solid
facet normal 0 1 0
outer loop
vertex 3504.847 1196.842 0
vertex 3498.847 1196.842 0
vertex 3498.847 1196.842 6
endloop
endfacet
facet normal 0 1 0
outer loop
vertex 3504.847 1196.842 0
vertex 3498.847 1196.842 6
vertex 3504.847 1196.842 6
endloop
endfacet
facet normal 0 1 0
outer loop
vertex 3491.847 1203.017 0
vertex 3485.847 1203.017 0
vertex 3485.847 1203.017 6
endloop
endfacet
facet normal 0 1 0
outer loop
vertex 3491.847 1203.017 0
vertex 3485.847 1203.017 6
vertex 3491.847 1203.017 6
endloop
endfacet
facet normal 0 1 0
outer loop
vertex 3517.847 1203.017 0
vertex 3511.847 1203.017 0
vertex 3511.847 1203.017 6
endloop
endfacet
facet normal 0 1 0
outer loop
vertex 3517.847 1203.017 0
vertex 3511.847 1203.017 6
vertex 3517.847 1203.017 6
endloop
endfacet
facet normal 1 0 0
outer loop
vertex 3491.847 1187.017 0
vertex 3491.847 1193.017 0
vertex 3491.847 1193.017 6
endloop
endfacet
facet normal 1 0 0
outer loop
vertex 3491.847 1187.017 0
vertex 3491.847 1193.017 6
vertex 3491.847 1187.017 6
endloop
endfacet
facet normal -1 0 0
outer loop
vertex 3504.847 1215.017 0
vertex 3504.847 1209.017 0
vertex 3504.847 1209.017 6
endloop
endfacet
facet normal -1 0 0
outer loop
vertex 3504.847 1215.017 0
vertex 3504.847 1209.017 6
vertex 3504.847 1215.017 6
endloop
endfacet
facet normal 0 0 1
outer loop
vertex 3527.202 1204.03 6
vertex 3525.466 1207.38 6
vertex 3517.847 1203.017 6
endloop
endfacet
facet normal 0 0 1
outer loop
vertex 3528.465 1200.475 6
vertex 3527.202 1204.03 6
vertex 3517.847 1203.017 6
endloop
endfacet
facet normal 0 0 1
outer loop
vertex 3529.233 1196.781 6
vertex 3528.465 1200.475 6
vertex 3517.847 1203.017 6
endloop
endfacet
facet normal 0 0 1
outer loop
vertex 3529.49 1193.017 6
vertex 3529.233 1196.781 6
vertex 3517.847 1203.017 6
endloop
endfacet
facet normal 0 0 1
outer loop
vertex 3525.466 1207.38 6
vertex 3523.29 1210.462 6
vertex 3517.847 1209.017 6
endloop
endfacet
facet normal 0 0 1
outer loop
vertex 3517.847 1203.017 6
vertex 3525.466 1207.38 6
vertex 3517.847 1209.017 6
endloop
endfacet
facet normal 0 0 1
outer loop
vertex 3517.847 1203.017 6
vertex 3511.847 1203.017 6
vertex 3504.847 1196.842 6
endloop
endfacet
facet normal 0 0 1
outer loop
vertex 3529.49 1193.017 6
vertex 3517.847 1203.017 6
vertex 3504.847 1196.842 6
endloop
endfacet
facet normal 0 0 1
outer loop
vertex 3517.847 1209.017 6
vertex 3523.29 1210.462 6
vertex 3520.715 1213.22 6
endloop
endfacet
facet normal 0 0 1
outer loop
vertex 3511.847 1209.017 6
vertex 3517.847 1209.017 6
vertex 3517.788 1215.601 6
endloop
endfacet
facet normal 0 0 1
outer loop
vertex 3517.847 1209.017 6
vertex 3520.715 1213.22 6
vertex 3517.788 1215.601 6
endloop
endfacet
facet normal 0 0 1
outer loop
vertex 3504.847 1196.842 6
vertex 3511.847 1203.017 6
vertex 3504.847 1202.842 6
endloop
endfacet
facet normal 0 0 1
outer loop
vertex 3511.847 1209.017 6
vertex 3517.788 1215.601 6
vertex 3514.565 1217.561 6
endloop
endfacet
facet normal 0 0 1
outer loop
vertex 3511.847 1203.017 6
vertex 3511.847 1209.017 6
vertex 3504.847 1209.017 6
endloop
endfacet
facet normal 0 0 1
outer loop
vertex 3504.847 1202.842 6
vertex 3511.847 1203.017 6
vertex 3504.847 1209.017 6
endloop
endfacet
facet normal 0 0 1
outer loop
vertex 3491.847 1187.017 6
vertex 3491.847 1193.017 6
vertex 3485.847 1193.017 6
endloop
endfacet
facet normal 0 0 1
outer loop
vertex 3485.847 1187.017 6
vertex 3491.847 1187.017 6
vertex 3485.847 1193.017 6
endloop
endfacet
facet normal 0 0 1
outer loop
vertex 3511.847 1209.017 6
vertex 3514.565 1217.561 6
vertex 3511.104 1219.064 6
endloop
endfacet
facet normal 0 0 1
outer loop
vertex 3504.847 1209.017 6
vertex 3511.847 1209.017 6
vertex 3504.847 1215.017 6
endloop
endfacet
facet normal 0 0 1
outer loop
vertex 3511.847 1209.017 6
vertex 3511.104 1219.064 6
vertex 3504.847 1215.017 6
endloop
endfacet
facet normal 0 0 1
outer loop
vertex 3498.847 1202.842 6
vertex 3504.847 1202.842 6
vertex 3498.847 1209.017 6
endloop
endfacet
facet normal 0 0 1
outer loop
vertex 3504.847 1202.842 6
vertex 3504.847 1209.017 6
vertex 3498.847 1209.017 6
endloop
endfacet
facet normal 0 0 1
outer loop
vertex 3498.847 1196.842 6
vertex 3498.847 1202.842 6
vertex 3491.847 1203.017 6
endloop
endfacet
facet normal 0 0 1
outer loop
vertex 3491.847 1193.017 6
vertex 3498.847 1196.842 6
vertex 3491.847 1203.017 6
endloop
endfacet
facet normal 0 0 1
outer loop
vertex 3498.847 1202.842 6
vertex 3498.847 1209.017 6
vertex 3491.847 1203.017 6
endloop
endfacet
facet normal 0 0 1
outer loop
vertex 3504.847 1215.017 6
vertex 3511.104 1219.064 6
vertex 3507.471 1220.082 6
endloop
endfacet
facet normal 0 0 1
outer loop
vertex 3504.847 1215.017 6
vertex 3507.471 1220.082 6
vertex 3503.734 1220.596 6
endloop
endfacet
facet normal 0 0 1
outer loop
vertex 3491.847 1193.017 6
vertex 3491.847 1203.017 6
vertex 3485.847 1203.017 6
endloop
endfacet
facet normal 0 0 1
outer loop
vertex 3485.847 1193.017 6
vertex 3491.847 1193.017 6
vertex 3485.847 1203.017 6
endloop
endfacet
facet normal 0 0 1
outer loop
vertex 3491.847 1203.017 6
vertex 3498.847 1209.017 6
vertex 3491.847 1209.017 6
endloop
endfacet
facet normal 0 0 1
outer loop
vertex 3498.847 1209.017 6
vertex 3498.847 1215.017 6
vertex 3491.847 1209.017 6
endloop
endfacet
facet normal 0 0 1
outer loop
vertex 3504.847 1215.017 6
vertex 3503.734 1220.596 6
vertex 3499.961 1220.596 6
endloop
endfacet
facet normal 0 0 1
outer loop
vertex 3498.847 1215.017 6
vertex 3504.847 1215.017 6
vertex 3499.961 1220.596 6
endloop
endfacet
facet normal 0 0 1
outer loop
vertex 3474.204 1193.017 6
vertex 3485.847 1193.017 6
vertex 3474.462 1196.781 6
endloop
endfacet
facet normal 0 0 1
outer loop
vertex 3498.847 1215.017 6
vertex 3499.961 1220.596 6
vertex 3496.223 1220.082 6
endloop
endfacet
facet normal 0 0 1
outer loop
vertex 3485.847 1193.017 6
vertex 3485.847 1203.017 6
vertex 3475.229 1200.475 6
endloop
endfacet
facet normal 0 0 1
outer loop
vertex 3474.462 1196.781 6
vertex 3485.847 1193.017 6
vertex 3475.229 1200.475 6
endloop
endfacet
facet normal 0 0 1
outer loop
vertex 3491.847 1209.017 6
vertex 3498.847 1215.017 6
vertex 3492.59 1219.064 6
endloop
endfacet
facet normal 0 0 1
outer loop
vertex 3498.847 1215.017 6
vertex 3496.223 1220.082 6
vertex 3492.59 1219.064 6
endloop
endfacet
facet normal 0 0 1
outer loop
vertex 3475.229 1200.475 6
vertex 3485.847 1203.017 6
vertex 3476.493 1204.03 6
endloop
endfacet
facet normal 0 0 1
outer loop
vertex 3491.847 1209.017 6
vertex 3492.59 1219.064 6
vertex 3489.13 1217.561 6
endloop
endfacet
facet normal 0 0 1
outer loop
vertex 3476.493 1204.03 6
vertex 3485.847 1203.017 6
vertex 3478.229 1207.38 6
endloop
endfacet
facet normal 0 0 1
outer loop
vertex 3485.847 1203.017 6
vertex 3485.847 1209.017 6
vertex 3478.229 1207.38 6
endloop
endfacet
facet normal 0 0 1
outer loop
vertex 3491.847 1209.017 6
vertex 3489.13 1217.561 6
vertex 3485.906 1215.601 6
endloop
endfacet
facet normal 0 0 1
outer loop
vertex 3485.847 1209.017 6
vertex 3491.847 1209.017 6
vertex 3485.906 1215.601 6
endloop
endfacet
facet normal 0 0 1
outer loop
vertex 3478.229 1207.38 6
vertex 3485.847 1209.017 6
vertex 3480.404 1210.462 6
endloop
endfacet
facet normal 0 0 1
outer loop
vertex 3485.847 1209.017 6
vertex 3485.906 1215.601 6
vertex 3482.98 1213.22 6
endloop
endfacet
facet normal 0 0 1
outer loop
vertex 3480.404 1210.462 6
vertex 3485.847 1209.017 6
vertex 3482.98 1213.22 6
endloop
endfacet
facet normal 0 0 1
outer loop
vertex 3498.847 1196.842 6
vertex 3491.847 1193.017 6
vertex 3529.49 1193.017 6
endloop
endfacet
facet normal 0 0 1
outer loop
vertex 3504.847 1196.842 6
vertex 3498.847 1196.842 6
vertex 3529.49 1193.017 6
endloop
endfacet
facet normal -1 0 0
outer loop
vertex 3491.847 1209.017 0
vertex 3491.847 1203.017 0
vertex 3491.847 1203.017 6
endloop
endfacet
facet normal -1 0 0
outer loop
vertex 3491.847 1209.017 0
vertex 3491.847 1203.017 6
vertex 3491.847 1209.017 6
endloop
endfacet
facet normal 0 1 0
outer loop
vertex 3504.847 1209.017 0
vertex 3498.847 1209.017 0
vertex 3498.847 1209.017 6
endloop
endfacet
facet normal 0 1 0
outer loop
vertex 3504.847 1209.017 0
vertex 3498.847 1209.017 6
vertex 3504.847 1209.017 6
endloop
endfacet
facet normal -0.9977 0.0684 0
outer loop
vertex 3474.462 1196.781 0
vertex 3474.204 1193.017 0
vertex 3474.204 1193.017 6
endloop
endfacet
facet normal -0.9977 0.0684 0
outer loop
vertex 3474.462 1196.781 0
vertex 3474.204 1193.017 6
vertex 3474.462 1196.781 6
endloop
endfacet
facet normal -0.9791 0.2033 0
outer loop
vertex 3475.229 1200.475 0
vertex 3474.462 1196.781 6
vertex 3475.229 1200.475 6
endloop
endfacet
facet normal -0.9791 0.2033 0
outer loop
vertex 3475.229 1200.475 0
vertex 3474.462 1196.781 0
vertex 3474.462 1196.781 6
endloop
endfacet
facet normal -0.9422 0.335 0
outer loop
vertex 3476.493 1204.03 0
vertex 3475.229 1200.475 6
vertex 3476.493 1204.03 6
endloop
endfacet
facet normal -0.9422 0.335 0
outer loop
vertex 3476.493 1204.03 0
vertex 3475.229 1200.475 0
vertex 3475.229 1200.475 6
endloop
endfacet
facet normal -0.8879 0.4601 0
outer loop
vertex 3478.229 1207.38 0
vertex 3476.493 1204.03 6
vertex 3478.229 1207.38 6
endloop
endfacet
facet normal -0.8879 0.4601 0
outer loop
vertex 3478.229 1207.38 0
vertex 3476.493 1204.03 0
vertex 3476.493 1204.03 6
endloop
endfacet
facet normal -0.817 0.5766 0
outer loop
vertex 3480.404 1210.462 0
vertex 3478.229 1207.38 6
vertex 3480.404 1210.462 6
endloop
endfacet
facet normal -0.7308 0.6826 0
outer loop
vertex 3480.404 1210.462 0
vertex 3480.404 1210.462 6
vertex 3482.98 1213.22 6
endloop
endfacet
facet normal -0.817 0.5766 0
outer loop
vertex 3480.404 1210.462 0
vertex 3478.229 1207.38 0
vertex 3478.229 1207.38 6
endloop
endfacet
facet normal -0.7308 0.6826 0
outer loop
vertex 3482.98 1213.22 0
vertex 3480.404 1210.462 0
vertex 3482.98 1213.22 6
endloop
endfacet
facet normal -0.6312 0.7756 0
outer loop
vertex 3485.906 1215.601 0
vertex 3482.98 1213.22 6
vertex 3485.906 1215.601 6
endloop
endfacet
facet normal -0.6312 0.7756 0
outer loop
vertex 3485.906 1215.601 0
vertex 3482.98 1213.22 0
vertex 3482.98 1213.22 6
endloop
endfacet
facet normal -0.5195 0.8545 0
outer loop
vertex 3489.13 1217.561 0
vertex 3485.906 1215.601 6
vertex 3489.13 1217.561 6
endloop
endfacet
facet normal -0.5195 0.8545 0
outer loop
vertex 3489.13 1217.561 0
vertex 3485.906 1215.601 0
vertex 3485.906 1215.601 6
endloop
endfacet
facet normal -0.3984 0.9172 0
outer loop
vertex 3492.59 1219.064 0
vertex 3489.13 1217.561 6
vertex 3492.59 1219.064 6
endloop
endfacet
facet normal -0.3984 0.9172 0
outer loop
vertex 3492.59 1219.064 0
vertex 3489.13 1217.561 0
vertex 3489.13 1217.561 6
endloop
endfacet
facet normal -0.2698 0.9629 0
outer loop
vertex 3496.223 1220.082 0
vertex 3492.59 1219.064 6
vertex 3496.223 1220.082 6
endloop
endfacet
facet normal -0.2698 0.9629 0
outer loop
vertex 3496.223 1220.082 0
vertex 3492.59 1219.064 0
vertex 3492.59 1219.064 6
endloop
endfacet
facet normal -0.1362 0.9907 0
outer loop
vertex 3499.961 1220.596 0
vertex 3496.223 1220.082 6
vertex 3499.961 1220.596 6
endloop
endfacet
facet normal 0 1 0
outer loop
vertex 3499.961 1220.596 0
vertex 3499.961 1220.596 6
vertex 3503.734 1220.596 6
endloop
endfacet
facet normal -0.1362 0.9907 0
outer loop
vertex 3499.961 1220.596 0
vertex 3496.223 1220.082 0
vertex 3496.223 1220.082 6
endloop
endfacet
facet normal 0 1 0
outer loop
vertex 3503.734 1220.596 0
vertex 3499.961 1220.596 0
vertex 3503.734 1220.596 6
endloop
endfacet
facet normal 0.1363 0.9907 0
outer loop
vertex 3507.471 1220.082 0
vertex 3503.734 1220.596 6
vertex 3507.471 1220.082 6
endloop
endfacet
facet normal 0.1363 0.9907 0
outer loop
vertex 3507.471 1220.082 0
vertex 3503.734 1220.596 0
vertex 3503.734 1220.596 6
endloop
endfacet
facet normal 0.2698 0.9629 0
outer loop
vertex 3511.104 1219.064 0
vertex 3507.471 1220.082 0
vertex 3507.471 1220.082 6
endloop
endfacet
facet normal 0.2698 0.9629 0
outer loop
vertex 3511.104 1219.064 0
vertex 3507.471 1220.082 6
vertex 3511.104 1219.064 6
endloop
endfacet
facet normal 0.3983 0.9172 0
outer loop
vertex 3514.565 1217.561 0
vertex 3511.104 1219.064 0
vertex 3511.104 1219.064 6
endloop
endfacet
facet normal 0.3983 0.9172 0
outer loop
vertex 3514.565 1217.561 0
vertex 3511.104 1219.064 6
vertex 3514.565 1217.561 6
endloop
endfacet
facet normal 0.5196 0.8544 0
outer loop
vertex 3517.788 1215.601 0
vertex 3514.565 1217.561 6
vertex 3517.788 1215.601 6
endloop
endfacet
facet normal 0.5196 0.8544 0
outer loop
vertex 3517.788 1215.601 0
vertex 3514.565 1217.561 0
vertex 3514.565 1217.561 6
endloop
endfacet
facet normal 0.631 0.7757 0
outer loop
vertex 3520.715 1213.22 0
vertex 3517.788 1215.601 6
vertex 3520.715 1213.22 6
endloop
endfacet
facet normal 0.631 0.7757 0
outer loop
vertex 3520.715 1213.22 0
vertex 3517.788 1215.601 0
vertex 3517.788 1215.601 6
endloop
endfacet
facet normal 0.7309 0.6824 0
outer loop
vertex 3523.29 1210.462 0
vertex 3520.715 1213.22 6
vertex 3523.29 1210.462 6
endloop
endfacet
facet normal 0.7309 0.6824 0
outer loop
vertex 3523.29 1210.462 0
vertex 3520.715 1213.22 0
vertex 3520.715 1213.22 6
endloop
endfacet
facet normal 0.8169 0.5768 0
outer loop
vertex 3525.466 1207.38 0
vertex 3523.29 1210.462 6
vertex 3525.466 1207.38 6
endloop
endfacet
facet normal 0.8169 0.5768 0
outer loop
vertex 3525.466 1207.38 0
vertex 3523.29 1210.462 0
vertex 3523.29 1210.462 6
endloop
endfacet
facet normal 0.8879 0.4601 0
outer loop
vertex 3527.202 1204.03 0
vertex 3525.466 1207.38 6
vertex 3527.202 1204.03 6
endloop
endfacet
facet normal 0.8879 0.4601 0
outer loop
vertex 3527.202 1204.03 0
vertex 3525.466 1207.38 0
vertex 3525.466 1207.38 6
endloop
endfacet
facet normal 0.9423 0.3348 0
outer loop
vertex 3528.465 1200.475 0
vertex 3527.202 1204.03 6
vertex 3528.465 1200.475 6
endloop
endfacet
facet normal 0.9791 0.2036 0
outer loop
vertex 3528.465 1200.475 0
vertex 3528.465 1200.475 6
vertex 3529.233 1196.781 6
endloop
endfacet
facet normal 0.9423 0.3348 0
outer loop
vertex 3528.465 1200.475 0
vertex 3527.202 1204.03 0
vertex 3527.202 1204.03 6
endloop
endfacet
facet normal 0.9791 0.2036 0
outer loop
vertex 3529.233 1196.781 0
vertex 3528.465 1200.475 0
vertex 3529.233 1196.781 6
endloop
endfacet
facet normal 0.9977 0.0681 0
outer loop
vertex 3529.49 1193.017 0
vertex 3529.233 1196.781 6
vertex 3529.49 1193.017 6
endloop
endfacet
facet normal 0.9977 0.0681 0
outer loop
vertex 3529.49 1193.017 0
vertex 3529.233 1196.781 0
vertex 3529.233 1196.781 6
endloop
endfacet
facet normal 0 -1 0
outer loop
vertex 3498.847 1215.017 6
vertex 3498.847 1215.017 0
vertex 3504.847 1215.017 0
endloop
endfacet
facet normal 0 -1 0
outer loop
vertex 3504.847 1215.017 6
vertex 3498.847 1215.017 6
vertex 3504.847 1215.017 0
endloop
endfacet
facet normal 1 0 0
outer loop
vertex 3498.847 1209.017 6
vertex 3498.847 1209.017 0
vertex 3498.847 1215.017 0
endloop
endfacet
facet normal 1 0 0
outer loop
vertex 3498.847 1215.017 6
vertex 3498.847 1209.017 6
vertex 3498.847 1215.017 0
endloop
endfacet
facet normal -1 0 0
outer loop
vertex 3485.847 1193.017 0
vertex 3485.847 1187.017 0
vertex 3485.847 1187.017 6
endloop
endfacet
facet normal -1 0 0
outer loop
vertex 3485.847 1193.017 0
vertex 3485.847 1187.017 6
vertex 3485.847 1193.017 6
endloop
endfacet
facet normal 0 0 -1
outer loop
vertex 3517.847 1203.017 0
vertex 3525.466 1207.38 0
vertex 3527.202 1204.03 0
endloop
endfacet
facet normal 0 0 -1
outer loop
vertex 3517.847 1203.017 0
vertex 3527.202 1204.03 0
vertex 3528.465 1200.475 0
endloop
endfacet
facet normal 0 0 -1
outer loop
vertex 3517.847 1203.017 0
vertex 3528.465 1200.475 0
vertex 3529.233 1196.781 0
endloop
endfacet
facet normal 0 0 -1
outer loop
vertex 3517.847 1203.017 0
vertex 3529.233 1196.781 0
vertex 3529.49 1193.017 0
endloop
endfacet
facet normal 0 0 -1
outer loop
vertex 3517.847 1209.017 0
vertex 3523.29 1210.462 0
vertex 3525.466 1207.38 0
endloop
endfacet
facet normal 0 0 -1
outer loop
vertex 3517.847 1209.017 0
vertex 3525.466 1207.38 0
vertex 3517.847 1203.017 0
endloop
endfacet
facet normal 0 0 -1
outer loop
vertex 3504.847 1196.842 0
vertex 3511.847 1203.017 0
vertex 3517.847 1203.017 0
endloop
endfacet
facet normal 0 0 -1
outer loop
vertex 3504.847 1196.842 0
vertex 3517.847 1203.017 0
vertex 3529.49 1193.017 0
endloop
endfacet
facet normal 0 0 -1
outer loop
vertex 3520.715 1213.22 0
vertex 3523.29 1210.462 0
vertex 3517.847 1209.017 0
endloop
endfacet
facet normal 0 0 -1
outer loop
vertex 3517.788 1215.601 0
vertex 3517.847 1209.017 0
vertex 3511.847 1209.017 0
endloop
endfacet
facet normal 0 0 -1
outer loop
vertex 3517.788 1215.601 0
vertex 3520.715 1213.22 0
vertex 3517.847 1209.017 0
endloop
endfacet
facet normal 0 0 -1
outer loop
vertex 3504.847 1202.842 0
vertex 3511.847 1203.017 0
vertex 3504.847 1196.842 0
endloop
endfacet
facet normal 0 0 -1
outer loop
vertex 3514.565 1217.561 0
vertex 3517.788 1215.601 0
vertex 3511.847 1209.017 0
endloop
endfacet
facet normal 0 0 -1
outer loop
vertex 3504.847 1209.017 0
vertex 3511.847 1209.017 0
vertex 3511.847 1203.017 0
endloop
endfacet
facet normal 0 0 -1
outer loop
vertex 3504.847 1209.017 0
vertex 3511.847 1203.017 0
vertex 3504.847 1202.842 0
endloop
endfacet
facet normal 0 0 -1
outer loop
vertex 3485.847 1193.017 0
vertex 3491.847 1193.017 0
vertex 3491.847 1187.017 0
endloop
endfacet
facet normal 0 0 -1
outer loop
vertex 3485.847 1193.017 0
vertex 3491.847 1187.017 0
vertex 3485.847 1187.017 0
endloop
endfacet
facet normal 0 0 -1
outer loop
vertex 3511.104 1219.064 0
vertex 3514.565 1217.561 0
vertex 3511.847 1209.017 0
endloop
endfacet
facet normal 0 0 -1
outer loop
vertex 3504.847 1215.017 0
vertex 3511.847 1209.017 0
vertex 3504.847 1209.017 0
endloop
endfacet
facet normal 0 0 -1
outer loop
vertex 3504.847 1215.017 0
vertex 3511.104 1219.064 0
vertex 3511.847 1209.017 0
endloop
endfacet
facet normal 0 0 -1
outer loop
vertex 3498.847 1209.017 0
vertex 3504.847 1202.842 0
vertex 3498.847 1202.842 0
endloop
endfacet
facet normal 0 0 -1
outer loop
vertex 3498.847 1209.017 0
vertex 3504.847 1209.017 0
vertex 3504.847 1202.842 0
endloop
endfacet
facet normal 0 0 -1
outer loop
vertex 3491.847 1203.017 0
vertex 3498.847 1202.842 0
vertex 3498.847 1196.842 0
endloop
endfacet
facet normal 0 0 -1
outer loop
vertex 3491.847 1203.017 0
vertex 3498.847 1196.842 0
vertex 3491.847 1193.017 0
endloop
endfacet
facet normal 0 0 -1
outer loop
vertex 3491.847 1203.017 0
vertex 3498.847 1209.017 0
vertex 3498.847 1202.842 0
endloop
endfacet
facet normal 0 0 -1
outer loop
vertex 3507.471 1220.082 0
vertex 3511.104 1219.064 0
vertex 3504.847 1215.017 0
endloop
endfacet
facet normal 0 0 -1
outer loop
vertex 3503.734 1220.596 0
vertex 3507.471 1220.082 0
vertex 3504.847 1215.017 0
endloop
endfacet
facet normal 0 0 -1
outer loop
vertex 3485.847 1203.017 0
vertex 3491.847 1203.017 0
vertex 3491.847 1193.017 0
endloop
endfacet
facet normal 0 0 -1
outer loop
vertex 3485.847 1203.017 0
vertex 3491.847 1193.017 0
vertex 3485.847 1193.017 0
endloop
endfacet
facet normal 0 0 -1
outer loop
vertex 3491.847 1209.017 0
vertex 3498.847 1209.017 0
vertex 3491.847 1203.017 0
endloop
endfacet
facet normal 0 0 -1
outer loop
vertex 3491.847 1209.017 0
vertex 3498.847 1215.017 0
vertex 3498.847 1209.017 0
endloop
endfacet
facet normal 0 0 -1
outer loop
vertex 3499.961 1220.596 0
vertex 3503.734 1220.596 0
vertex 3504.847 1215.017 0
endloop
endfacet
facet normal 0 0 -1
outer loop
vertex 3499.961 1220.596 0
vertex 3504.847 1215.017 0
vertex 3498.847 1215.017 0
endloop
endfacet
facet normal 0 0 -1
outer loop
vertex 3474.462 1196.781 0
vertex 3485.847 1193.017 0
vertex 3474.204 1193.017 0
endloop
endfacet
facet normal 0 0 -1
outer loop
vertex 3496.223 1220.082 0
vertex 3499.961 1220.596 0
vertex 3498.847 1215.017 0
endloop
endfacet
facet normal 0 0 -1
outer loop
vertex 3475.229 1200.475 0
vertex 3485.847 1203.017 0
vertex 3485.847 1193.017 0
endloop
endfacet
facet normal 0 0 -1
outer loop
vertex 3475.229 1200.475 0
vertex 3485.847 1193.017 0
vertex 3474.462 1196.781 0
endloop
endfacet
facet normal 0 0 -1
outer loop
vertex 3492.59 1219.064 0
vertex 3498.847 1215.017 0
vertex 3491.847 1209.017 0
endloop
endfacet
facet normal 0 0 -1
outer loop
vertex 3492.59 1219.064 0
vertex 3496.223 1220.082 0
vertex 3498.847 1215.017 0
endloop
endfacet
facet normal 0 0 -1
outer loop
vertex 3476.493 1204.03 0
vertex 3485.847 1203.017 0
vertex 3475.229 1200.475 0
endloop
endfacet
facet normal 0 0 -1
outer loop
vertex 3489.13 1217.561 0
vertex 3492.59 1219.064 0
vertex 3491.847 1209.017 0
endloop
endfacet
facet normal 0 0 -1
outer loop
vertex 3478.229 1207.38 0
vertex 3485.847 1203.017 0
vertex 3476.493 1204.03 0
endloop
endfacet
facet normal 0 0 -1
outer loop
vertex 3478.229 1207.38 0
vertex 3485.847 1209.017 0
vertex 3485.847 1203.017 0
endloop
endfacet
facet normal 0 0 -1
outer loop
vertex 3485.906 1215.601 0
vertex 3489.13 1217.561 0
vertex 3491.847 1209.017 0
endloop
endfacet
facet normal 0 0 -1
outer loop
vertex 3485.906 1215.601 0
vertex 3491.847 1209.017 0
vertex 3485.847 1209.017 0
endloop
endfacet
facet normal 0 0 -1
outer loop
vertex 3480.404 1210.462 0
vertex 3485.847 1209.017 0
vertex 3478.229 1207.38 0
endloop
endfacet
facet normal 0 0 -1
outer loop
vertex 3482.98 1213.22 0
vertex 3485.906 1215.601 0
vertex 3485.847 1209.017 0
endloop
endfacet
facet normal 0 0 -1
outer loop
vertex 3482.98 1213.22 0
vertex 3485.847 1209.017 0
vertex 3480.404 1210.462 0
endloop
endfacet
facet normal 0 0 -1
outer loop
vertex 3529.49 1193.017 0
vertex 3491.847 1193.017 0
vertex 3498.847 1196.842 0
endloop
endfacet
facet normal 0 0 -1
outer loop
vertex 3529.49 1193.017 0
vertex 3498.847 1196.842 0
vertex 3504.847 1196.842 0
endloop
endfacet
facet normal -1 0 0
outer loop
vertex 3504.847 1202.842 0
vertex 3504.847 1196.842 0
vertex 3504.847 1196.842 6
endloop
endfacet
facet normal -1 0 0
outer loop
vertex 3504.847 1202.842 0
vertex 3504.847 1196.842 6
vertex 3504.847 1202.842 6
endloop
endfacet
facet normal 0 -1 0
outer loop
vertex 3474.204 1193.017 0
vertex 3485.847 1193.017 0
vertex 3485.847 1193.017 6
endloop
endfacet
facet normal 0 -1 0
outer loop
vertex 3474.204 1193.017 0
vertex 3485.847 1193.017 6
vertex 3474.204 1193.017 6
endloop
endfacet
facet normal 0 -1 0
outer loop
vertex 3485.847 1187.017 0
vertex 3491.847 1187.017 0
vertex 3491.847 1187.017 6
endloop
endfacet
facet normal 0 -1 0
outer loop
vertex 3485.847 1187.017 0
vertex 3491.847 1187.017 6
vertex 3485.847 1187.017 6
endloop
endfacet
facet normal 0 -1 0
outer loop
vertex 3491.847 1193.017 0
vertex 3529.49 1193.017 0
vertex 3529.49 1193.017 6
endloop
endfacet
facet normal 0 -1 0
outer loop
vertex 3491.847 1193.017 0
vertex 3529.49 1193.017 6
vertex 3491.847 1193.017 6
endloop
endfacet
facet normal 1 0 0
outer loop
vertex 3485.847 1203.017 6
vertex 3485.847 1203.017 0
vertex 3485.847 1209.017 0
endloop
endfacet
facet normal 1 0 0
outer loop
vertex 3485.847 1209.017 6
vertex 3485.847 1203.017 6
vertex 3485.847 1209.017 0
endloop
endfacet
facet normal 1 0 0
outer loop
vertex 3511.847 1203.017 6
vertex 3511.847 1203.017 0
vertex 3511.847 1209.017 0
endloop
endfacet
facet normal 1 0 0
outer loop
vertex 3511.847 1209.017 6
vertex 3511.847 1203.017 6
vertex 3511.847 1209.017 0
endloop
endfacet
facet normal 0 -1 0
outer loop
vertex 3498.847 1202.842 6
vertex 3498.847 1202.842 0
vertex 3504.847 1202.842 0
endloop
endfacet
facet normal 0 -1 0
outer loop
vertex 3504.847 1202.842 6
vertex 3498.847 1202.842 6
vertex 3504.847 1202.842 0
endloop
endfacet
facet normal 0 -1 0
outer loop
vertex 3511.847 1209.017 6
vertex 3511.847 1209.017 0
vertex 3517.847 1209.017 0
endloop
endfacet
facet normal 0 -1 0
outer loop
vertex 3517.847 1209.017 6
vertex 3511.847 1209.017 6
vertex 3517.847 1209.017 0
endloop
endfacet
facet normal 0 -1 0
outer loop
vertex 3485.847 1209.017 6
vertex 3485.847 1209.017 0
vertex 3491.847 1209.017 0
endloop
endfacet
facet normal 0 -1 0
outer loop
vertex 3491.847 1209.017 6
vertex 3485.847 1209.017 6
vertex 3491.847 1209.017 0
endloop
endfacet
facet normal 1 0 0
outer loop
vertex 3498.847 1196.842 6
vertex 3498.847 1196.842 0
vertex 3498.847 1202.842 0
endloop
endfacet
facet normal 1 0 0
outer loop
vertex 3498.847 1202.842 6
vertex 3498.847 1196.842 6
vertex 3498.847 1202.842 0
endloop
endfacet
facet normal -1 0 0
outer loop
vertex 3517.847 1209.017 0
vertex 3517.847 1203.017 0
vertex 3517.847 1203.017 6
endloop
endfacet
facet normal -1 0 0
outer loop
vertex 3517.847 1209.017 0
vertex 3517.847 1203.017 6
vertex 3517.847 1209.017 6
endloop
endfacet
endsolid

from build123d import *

# Parameters (mm, degrees)
MODEL_W             = 6
MODEL_H             = 6
BOSS_EXTRUDE1_DEPTH = 6


with BuildPart() as part:
    # Model → Boss-Extrude1 (new body)
    with BuildSketch(Plane.XY):
        with BuildLine():
            Line((3491.847275697, 1193.017146611), (3491.847275697, 1187.017146611))
            Line((3491.847275697, 1187.017146611), (3485.847275697, 1187.017146611))
            Line((3485.847275697, 1187.017146611), (3485.847275697, 1193.017146611))
            Line((3485.847275697, 1193.017146611), (3474.204418554, 1193.017146611))
            ThreePointArc((3474.204418554, 1193.017146611), (3501.847275697, 1220.660003754), (3529.49013284, 1193.017146611))
            Line((3529.49013284, 1193.017146611), (3491.847275697, 1193.017146611))
        make_face()
        with Locations((3514.847275697, 1206.017146611)):
            Rectangle(MODEL_W, MODEL_H, mode=Mode.SUBTRACT)
        with Locations((3488.847275697, 1206.017146611)):
            Rectangle(MODEL_W, MODEL_H, mode=Mode.SUBTRACT)
        with Locations((3501.847275697, 1212.017146611)):
            Rectangle(MODEL_W, MODEL_H, mode=Mode.SUBTRACT)
        with Locations((3501.847275697, 1199.841605445)):
            Rectangle(MODEL_W, MODEL_H, mode=Mode.SUBTRACT)
    extrude(amount=BOSS_EXTRUDE1_DEPTH)


solid = part.part
